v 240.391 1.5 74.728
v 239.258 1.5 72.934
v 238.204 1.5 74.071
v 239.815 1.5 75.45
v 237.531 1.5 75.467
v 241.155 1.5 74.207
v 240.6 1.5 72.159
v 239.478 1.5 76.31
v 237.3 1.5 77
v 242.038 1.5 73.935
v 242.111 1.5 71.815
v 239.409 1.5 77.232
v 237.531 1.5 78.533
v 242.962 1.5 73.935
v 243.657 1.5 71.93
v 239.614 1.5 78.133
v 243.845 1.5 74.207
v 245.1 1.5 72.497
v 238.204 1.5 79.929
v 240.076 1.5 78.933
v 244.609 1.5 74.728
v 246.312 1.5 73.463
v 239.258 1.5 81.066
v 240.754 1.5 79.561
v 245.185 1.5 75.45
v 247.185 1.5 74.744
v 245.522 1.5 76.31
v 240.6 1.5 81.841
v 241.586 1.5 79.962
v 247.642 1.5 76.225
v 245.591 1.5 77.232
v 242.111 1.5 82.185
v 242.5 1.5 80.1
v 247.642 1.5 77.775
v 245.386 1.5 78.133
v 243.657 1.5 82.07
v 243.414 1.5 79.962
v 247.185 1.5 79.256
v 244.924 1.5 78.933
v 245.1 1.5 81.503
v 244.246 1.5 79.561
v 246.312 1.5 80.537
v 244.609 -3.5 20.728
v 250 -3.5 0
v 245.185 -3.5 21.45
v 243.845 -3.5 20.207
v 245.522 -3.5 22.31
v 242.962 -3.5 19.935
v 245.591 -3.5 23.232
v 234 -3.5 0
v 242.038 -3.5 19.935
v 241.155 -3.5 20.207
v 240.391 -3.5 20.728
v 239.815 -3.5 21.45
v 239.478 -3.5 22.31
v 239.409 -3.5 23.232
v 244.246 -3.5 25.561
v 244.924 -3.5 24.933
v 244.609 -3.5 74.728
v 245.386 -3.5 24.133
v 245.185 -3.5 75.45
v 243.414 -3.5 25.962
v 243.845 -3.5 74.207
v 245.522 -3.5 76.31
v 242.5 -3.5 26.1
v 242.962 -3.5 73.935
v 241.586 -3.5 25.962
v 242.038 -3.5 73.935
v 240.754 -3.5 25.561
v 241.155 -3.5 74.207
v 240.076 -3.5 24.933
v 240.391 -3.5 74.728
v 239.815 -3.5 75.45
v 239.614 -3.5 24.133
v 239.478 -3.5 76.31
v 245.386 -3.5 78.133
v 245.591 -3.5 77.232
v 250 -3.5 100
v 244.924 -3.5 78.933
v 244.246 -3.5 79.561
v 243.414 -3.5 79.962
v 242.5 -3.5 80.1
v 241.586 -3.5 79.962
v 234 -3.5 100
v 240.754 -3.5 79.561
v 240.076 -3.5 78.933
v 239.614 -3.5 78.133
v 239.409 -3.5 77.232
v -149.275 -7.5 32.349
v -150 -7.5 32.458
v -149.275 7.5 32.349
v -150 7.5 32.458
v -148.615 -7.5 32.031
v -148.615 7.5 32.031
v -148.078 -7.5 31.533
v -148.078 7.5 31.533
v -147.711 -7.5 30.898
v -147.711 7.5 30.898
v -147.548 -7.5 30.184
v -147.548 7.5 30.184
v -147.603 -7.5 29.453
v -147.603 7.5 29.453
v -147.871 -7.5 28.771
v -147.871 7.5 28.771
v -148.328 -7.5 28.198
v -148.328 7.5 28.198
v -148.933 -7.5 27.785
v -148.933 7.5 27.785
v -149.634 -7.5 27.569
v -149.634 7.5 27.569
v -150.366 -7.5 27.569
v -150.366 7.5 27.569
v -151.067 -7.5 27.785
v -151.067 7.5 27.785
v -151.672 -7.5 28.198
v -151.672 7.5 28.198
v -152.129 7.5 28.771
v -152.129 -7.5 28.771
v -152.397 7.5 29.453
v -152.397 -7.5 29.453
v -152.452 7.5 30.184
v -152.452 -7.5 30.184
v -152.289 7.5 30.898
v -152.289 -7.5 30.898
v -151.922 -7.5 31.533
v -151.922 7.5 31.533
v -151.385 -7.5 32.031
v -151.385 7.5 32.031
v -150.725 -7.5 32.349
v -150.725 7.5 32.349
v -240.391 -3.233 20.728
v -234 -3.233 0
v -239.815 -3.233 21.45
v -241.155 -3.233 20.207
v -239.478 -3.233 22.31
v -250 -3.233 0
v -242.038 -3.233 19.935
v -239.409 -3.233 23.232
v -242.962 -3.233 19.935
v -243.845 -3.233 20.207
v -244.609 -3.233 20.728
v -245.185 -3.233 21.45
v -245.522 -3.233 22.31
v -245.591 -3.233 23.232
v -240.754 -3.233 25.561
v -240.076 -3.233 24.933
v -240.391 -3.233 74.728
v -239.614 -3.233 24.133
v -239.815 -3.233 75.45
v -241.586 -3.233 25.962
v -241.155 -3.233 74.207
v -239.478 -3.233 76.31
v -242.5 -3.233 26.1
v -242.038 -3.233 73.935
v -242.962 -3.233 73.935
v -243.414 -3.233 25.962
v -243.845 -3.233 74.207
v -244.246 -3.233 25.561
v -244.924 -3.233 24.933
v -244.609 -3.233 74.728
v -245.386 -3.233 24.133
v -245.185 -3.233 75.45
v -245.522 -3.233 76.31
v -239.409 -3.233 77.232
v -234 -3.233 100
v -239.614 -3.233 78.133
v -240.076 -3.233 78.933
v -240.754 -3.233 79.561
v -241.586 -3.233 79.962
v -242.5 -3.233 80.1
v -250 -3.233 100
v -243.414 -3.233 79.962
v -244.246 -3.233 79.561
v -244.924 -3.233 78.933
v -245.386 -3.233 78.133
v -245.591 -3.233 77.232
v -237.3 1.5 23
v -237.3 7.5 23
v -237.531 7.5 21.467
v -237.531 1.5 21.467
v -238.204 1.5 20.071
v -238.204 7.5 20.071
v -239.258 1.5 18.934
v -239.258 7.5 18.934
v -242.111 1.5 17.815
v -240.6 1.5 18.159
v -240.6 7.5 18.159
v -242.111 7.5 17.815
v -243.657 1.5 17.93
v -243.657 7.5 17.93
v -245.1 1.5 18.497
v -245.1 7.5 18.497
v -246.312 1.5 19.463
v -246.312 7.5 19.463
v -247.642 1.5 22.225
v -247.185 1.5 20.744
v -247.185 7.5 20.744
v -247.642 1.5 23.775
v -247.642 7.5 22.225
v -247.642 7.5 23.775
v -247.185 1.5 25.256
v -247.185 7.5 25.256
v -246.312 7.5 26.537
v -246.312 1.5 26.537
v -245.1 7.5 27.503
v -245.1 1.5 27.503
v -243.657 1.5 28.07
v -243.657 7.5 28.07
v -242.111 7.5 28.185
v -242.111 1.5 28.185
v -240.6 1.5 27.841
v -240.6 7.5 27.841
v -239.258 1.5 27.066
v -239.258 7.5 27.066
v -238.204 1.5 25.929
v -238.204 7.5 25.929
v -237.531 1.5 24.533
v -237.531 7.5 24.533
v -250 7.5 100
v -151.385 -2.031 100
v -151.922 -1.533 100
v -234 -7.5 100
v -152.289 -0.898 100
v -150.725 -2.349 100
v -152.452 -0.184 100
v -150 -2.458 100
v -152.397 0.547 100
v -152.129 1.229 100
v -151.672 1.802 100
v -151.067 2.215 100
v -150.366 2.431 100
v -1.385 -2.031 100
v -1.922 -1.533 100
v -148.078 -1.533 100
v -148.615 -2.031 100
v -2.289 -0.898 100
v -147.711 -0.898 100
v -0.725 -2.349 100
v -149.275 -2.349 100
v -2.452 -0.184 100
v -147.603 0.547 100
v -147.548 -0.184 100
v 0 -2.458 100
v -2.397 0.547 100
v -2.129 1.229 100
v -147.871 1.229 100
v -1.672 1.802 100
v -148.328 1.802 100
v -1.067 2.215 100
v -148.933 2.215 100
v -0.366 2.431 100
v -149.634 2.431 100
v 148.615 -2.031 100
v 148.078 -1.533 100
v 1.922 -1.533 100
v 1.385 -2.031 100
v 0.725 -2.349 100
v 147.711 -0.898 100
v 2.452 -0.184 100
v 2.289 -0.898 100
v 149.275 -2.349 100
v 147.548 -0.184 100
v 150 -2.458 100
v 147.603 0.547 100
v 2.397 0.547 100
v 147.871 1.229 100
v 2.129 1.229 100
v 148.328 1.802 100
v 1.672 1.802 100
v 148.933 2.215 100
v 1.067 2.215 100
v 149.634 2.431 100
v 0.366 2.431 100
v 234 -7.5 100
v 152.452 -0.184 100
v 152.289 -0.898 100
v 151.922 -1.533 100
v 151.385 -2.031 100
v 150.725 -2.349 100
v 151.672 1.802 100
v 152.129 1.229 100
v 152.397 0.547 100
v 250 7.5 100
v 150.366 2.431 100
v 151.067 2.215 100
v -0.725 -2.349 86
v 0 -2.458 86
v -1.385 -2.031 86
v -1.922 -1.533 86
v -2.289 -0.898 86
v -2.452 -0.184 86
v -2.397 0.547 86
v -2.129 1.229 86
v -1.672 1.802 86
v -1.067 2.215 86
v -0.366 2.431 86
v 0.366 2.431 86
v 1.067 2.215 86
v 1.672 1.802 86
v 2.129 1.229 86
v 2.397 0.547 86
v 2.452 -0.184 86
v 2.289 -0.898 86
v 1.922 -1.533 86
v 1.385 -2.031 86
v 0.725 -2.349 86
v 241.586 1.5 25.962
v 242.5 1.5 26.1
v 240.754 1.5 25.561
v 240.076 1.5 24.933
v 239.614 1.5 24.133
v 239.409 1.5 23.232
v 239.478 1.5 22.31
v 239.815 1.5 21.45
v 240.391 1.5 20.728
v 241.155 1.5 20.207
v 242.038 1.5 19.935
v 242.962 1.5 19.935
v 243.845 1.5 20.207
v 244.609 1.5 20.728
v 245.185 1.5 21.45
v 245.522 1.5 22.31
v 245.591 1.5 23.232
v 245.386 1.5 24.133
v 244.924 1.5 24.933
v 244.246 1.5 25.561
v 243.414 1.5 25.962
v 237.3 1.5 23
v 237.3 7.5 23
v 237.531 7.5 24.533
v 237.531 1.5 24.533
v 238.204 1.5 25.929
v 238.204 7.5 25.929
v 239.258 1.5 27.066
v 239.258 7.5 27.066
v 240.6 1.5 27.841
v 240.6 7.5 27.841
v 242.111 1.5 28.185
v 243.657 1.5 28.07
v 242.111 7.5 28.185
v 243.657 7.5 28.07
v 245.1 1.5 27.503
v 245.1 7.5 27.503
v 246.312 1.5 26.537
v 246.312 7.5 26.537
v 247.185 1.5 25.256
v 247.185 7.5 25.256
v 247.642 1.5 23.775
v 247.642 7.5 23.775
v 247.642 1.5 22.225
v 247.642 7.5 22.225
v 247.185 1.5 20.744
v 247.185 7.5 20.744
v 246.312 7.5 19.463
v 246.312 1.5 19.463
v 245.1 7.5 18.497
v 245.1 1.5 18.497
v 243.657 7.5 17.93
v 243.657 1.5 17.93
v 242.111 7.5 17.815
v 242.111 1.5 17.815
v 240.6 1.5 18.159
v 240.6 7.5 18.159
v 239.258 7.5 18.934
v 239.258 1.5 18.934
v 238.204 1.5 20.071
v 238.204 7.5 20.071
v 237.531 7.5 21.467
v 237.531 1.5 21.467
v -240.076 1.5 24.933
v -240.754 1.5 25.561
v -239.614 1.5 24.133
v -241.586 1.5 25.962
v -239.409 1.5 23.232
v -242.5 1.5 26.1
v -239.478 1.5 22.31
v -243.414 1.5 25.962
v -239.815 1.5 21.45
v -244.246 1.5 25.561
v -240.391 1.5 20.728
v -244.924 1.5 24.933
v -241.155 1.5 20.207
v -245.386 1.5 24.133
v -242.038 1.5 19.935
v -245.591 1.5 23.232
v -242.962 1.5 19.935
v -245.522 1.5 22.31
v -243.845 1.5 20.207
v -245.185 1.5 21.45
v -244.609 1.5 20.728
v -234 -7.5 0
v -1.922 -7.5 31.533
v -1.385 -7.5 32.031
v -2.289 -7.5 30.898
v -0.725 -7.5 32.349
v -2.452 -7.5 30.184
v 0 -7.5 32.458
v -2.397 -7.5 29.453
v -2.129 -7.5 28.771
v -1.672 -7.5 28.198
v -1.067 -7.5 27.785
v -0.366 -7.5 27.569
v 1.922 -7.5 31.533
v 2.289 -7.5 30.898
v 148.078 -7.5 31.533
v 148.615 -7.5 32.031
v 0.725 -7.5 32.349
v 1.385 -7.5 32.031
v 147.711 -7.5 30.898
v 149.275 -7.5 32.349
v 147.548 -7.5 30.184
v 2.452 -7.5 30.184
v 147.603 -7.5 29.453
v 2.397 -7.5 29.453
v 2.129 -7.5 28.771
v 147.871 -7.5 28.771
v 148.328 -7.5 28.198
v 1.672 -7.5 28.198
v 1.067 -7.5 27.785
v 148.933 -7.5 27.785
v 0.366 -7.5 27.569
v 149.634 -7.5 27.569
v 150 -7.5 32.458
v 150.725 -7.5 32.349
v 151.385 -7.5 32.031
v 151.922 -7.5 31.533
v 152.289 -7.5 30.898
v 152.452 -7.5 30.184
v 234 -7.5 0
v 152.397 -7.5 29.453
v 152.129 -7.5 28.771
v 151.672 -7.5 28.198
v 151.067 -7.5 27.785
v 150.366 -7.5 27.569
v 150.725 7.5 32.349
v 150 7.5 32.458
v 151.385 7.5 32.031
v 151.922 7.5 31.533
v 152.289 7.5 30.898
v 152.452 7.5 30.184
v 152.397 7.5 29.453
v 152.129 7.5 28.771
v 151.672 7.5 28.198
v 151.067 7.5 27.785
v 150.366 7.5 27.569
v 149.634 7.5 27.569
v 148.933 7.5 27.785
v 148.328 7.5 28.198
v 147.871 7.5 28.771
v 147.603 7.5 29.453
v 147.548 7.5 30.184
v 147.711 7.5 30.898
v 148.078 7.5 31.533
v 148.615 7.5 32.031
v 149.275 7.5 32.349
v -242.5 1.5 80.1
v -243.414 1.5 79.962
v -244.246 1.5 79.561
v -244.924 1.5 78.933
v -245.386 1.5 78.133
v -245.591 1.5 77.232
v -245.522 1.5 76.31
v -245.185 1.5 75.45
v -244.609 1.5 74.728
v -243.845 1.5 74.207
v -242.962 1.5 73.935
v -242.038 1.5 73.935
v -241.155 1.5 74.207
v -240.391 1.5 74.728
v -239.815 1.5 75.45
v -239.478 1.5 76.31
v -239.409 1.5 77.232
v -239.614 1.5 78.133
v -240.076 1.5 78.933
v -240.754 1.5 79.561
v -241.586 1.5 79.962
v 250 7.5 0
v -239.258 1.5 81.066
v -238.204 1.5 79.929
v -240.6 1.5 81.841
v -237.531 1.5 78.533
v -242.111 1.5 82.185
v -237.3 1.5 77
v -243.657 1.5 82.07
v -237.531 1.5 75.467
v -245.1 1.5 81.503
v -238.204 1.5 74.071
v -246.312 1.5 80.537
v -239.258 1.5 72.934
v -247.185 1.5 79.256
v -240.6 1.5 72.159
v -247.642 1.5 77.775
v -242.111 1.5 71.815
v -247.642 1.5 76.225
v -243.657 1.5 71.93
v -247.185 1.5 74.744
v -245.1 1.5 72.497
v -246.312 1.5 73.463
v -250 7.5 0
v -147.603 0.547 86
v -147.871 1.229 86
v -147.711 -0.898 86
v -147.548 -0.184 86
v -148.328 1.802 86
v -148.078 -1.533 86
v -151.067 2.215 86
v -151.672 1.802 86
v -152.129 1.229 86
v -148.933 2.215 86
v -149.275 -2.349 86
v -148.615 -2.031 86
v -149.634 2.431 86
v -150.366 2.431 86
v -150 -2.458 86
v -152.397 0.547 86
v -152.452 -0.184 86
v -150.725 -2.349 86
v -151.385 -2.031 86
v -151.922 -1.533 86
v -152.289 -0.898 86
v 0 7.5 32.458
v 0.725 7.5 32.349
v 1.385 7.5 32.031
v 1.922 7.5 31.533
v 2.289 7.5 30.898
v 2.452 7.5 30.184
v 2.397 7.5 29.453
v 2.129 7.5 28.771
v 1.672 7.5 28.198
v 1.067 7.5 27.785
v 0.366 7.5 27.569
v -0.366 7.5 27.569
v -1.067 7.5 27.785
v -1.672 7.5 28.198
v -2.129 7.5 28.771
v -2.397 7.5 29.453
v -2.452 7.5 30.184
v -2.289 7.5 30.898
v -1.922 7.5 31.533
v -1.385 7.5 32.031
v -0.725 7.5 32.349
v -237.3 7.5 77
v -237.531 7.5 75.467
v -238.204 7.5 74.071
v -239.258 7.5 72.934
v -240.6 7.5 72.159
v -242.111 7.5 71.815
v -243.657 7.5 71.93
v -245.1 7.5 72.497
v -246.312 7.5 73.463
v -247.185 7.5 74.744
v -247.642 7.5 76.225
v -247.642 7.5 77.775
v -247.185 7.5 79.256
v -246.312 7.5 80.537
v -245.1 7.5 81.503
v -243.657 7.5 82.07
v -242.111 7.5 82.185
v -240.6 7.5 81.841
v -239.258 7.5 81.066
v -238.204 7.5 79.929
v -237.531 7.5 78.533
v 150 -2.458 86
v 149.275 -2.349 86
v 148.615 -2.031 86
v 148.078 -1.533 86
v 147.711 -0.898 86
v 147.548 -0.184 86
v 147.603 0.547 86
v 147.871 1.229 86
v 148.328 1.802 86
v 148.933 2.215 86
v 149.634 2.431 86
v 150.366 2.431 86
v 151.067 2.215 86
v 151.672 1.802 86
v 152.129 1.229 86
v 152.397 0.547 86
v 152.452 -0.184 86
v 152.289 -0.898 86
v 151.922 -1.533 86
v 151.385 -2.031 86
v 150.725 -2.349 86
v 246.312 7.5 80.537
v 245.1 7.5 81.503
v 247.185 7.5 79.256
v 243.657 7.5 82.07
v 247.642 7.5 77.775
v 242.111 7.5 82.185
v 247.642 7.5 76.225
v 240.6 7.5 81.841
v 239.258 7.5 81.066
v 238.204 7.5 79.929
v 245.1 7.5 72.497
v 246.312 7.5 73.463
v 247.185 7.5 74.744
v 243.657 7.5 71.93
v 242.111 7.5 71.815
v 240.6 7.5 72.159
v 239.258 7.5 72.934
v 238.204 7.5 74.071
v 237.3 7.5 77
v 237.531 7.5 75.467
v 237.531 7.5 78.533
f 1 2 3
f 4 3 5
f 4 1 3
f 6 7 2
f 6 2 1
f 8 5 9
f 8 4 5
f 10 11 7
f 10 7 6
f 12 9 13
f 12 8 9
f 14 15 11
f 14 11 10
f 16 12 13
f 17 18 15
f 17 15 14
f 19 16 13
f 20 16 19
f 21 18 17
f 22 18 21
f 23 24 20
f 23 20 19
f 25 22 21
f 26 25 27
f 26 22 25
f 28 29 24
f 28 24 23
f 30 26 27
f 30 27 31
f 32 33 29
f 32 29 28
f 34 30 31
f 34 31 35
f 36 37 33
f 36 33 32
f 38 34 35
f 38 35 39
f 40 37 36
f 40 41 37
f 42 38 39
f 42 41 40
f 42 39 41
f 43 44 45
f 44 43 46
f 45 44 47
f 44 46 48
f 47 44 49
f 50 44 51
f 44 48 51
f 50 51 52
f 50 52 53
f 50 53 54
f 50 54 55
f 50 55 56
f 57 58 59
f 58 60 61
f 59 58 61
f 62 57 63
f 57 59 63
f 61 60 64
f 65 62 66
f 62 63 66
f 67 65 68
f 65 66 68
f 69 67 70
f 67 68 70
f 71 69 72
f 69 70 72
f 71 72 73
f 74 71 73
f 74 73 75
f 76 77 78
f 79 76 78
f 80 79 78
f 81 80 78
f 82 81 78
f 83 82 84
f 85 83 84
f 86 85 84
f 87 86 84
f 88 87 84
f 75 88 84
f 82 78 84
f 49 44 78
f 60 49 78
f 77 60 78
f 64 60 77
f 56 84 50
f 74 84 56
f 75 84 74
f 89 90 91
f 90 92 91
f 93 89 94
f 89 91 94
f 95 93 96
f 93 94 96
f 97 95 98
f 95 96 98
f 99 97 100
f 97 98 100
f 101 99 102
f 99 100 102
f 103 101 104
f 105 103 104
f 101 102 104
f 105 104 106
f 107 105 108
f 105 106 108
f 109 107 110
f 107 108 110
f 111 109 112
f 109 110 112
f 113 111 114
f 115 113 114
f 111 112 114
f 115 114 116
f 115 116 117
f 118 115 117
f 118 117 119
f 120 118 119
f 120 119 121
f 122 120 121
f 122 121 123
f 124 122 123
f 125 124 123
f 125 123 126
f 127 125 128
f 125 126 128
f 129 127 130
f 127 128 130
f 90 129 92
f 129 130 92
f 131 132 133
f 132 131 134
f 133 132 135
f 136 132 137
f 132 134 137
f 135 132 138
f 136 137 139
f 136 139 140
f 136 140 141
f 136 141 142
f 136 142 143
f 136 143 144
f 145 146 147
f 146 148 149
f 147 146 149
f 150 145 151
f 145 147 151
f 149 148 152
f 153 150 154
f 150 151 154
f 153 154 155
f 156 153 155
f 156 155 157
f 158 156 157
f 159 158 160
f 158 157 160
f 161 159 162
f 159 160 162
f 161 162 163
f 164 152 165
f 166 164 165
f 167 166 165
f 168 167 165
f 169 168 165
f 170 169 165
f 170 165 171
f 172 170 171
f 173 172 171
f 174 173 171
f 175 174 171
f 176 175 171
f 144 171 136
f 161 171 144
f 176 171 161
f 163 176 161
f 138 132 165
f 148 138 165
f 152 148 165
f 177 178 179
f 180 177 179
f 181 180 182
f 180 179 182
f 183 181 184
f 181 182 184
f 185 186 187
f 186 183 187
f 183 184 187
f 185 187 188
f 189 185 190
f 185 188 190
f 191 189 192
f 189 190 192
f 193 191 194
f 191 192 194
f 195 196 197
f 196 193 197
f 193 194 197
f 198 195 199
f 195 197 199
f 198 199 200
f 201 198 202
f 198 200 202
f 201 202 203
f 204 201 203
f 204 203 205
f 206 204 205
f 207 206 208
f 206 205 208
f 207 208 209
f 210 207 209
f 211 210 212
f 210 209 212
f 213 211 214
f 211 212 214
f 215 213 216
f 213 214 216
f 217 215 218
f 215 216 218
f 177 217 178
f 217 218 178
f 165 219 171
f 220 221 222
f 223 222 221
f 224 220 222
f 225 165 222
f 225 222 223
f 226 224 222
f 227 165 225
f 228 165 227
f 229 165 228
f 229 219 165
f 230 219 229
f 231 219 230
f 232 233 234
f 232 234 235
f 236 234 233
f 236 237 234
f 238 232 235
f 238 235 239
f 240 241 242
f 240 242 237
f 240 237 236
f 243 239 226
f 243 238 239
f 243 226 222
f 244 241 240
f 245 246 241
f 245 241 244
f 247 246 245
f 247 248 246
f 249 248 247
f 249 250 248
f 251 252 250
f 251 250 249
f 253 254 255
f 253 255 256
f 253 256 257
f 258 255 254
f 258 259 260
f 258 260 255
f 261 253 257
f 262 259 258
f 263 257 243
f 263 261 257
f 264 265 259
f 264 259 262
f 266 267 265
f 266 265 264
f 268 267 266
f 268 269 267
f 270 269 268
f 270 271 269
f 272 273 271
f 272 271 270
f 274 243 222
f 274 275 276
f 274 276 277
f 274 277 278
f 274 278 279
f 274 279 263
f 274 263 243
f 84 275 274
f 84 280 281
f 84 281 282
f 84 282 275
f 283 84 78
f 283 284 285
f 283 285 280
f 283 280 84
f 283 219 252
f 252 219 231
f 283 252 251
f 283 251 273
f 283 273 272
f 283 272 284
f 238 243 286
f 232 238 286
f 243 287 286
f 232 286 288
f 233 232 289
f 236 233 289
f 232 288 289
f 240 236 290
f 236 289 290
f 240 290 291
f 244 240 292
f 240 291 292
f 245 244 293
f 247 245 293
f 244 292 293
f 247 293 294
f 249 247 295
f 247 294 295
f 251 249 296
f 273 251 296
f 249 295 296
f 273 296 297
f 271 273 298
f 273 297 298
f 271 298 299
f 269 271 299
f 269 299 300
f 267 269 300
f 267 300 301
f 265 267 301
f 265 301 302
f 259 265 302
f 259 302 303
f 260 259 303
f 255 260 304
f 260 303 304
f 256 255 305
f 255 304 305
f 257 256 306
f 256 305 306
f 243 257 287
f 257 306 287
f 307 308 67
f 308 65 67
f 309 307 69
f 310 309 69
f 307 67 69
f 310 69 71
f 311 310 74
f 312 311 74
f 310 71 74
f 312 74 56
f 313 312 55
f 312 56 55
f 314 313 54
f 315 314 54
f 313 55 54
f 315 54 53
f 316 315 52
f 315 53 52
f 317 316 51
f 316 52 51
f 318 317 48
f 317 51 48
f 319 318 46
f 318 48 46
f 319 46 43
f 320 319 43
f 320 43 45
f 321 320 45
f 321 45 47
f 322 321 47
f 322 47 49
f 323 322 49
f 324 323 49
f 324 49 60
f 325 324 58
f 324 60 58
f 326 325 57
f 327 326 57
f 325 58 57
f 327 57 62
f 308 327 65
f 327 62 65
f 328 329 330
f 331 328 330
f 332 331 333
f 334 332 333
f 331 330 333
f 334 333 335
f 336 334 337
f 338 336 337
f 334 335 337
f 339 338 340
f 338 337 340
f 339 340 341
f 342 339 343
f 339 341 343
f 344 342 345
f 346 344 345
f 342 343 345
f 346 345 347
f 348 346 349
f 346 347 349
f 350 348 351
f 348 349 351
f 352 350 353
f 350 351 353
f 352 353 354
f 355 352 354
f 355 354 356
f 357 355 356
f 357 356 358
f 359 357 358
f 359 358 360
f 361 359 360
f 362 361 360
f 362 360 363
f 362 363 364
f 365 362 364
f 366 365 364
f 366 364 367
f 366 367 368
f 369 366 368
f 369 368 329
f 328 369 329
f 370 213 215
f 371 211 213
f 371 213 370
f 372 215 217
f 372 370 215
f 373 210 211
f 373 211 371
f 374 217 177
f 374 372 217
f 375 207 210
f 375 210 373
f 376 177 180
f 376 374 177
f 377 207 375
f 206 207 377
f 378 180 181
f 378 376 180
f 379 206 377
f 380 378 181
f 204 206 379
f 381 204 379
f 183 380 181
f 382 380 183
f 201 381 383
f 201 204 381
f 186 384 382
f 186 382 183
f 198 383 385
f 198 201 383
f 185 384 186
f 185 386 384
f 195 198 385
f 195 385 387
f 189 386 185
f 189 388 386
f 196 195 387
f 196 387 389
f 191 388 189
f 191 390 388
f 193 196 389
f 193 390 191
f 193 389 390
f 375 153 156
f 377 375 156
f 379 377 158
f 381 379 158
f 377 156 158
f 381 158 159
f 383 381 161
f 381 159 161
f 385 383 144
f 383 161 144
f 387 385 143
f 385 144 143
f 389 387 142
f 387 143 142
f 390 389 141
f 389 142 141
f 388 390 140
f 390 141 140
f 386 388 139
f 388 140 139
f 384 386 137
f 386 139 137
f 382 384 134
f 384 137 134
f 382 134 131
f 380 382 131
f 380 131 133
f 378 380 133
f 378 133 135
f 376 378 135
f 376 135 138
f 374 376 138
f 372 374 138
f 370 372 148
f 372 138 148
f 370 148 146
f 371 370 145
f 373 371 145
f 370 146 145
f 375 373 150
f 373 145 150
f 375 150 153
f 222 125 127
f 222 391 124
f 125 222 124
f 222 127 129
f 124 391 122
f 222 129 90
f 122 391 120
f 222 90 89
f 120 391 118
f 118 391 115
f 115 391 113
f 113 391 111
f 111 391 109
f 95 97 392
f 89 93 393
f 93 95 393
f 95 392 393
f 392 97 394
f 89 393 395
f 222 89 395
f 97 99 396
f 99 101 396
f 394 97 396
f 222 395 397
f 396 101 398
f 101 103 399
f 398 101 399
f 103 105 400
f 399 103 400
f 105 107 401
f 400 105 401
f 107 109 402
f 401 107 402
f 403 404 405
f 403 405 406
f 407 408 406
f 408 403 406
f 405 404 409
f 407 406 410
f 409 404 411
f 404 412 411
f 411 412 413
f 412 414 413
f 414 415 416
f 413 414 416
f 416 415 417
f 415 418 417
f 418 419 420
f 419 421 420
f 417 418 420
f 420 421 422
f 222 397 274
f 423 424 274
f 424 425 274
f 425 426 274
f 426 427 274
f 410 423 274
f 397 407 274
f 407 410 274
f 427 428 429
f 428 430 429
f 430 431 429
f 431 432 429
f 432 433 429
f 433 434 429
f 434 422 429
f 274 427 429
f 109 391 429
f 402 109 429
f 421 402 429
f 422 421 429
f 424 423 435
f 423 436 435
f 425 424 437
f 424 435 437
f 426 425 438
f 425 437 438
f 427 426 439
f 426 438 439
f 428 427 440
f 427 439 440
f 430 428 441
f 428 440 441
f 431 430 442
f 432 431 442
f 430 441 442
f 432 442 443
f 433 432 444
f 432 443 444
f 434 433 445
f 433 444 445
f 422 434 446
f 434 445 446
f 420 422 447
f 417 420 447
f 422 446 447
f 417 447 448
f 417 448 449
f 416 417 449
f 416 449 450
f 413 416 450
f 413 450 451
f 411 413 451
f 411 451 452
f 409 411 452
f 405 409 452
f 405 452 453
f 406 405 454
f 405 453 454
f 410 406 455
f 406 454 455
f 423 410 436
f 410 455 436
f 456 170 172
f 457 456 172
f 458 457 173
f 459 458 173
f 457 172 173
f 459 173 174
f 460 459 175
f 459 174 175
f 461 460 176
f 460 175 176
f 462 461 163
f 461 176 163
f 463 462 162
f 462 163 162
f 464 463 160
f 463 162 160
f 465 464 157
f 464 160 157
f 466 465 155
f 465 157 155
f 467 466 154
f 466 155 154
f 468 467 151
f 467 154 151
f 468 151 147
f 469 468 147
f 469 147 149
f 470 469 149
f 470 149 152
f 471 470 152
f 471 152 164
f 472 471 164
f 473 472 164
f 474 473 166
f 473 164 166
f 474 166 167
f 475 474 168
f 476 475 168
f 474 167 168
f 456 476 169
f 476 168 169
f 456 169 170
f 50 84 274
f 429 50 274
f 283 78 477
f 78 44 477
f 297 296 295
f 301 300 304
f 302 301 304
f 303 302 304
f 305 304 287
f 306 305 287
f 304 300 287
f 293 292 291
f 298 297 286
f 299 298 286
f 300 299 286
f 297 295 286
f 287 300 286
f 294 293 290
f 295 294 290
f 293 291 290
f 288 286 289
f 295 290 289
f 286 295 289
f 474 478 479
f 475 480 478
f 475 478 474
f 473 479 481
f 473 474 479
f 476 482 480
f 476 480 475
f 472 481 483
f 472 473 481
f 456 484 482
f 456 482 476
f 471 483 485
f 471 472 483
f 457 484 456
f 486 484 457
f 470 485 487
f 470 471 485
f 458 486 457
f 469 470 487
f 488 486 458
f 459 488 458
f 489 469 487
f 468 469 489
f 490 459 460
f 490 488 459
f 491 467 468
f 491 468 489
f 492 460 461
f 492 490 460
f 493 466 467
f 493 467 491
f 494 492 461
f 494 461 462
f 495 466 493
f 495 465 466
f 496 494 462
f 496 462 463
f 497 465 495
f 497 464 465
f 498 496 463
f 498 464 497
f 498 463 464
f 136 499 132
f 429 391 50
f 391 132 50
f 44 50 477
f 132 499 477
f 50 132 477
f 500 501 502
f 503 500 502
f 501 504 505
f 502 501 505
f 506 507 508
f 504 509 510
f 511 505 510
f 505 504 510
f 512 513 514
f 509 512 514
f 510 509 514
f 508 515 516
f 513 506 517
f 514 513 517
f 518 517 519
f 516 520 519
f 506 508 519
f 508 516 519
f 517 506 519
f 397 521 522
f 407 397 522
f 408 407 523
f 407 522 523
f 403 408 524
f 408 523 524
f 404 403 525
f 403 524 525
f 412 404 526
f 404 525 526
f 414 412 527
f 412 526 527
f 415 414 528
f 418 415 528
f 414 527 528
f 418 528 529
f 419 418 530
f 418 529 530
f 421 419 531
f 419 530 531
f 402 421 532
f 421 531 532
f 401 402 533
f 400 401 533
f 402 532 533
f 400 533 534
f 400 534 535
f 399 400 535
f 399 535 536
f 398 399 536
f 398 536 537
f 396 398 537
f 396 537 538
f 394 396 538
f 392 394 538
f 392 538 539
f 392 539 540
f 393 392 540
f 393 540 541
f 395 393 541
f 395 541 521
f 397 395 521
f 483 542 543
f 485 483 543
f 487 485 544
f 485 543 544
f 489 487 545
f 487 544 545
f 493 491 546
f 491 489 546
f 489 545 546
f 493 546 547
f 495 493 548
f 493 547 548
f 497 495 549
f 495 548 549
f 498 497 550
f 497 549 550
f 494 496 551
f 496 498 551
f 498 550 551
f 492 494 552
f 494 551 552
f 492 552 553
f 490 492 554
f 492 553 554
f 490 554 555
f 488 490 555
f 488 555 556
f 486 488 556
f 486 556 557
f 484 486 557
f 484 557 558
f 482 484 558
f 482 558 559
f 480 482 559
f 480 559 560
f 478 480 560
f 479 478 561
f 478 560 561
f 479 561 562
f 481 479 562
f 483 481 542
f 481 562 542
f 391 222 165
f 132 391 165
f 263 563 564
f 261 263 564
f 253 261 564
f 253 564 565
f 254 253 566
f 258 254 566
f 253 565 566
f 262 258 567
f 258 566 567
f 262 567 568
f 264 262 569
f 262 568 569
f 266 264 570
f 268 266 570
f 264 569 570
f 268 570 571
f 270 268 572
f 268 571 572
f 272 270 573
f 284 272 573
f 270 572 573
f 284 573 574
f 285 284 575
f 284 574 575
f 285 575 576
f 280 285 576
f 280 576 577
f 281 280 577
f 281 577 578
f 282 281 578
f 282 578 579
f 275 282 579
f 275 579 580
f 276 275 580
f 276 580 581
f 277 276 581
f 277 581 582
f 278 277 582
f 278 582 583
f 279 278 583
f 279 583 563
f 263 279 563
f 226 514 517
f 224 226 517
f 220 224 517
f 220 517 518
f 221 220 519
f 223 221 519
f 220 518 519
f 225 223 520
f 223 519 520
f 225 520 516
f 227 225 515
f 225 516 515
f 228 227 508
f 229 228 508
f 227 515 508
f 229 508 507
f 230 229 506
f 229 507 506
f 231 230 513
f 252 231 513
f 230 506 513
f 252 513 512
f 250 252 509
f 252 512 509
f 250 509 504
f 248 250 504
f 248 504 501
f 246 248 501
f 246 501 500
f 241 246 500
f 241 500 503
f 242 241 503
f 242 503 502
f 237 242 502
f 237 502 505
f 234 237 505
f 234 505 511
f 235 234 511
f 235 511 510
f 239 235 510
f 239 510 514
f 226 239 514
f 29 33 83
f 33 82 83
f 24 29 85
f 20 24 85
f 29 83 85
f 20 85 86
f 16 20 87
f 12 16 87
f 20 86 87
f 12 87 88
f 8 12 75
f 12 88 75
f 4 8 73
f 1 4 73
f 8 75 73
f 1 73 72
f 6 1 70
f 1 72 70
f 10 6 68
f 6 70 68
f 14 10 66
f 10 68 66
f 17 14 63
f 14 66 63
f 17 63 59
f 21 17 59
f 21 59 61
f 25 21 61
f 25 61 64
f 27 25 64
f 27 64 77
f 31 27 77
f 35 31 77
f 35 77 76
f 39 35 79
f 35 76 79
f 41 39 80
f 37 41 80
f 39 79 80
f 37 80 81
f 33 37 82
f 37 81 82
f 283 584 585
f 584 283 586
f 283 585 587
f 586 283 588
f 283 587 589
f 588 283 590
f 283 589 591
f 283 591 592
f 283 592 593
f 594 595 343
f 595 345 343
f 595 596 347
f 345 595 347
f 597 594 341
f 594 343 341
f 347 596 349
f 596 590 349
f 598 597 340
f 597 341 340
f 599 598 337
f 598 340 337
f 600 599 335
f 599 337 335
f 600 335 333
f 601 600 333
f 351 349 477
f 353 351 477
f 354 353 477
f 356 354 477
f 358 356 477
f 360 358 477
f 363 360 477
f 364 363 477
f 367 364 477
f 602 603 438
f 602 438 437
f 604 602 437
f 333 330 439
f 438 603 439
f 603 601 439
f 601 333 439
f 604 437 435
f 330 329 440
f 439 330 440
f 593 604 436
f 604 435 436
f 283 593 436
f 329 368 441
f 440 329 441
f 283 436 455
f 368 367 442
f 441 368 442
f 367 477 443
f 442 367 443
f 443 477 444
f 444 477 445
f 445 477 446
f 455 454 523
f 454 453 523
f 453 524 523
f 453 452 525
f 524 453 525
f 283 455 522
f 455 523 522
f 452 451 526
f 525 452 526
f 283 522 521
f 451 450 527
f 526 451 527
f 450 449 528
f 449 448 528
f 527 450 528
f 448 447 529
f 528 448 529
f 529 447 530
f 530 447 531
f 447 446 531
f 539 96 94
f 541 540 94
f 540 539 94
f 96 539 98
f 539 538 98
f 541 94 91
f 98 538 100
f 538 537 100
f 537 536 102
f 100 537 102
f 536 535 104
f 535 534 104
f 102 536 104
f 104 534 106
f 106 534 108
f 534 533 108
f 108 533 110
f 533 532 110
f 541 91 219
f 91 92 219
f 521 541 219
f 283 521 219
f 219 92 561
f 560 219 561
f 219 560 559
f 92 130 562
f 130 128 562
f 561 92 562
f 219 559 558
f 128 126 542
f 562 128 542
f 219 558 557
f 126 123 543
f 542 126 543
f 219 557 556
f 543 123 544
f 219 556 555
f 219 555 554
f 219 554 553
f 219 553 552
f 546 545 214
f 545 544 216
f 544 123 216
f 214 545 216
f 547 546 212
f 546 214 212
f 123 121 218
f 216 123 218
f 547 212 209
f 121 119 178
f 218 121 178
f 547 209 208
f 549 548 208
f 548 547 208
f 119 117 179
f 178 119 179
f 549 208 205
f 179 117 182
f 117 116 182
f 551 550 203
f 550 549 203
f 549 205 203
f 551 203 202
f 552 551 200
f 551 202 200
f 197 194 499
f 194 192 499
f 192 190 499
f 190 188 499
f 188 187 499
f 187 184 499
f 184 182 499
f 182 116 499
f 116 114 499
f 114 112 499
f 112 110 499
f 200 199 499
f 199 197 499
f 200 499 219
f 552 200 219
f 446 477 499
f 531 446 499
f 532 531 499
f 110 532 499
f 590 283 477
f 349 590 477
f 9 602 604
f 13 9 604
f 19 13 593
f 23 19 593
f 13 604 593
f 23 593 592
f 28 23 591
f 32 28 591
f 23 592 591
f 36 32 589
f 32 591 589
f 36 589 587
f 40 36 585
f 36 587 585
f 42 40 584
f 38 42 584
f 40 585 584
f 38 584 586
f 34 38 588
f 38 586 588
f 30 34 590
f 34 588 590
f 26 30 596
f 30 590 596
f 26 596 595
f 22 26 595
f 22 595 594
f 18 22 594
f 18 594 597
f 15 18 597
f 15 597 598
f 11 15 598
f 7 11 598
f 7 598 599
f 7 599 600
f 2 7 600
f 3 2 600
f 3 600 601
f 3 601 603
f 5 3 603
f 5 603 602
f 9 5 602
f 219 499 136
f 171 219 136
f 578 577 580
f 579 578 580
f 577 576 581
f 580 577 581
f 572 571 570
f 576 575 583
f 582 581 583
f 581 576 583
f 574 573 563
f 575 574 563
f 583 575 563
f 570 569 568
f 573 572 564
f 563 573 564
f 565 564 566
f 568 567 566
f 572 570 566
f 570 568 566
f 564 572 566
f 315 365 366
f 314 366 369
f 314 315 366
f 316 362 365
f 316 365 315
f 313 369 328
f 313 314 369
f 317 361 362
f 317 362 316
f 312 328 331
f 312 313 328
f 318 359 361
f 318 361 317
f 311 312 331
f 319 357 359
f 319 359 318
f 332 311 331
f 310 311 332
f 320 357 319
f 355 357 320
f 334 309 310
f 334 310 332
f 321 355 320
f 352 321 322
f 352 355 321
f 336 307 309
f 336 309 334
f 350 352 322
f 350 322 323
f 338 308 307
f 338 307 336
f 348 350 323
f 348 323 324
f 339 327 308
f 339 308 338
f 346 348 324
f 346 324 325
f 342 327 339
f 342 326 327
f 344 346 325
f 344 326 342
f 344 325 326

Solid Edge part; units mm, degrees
sketch "Sketch1" plane through (0, 0, 0) normal (0, 0, 1) x (1, 0, 0)
  line L0 (-250, -7.5) -> (250, -7.5)
  line L1 (250, -7.5) -> (250, 7.5)
  line L2 (250, 7.5) -> (-250, 7.5)
  line L3 (-250, 7.5) -> (-250, -7.5)
extrude "Protrusion1" add sketch "Sketch1" along normal blind 100
sketch "Sketch2" plane through (0, 0, 100) normal (0, 0, 1) x (-1, 0, 0)
  line L0 (250, 7.5) -> (234, 7.5)
  line L1 (234, 7.5) -> (234, 3.2333)
  line L2 (234, 3.2333) -> (250, 3.2333)
  line L3 (250, 3.2333) -> (250, 7.5)
  line L4 (-250, 7.5) -> (-250, 3.5)
  line L5 (-250, 3.5) -> (-234, 3.5)
  line L6 (-234, 3.5) -> (-234, 7.5)
  line L7 (-234, 7.5) -> (-250, 7.5)
  dimension "D1" = 16
extrude "Cutout1" cut sketch "Sketch2" against normal up to next
sketch "Sketch3" plane through (242.5, -3.5, 50) normal (0, -1, 0) x (0, 0, 1)
  circle A0 centre (27, 0) radius 3.1
  circle A1 centre (-27, 0) radius 3.1
  dimension "D1" = 23
  dimension "D2" = 54
  dimension "D3" = 7.5
  dimension "D4" = 8.5
extrude "Cutout2" cut sketch "Sketch3" against normal up to next
sketch "Sketch4" plane through (0, 7.5, 50) normal (0, 1, 0) x (-1, 0, 0)
  circle A0 centre (-242.5, -27) radius 5.2
  circle A1 centre (-242.5, 27) radius 5.2
extrude "ExtrudedCutout_3" cut sketch "Sketch4" against normal blind 6
mirror "Mirror1" about plane through (0, 0, 0) normal (1, 0, 0) of "Cutout2", "ExtrudedCutout_3"
hole "Hole_9" at (0, 7.5, 30) direction (0, -1, 0) diameter 4.917 end up to next thread major 6 thread length 15
hole "Hole1" at (-150, 7.5, 30) direction (0, -1, 0) diameter 4.917 end up to next thread major 6 thread length 15
hole "Hole2" at (150, 7.5, 30) direction (0, -1, 0) diameter 4.917 end up to next thread major 6 thread length 15
hole "Hole_15" at (0, 0, 100) direction (0, 0, -1) diameter 4.917 depth 14 thread major 6 thread length 12
hole "Hole3" at (150, 0, 100) direction (0, 0, -1) diameter 4.917 depth 14 thread major 6 thread length 12
hole "Hole4" at (-150, 0, 100) direction (0, 0, -1) diameter 4.917 depth 14 thread major 6 thread length 12
